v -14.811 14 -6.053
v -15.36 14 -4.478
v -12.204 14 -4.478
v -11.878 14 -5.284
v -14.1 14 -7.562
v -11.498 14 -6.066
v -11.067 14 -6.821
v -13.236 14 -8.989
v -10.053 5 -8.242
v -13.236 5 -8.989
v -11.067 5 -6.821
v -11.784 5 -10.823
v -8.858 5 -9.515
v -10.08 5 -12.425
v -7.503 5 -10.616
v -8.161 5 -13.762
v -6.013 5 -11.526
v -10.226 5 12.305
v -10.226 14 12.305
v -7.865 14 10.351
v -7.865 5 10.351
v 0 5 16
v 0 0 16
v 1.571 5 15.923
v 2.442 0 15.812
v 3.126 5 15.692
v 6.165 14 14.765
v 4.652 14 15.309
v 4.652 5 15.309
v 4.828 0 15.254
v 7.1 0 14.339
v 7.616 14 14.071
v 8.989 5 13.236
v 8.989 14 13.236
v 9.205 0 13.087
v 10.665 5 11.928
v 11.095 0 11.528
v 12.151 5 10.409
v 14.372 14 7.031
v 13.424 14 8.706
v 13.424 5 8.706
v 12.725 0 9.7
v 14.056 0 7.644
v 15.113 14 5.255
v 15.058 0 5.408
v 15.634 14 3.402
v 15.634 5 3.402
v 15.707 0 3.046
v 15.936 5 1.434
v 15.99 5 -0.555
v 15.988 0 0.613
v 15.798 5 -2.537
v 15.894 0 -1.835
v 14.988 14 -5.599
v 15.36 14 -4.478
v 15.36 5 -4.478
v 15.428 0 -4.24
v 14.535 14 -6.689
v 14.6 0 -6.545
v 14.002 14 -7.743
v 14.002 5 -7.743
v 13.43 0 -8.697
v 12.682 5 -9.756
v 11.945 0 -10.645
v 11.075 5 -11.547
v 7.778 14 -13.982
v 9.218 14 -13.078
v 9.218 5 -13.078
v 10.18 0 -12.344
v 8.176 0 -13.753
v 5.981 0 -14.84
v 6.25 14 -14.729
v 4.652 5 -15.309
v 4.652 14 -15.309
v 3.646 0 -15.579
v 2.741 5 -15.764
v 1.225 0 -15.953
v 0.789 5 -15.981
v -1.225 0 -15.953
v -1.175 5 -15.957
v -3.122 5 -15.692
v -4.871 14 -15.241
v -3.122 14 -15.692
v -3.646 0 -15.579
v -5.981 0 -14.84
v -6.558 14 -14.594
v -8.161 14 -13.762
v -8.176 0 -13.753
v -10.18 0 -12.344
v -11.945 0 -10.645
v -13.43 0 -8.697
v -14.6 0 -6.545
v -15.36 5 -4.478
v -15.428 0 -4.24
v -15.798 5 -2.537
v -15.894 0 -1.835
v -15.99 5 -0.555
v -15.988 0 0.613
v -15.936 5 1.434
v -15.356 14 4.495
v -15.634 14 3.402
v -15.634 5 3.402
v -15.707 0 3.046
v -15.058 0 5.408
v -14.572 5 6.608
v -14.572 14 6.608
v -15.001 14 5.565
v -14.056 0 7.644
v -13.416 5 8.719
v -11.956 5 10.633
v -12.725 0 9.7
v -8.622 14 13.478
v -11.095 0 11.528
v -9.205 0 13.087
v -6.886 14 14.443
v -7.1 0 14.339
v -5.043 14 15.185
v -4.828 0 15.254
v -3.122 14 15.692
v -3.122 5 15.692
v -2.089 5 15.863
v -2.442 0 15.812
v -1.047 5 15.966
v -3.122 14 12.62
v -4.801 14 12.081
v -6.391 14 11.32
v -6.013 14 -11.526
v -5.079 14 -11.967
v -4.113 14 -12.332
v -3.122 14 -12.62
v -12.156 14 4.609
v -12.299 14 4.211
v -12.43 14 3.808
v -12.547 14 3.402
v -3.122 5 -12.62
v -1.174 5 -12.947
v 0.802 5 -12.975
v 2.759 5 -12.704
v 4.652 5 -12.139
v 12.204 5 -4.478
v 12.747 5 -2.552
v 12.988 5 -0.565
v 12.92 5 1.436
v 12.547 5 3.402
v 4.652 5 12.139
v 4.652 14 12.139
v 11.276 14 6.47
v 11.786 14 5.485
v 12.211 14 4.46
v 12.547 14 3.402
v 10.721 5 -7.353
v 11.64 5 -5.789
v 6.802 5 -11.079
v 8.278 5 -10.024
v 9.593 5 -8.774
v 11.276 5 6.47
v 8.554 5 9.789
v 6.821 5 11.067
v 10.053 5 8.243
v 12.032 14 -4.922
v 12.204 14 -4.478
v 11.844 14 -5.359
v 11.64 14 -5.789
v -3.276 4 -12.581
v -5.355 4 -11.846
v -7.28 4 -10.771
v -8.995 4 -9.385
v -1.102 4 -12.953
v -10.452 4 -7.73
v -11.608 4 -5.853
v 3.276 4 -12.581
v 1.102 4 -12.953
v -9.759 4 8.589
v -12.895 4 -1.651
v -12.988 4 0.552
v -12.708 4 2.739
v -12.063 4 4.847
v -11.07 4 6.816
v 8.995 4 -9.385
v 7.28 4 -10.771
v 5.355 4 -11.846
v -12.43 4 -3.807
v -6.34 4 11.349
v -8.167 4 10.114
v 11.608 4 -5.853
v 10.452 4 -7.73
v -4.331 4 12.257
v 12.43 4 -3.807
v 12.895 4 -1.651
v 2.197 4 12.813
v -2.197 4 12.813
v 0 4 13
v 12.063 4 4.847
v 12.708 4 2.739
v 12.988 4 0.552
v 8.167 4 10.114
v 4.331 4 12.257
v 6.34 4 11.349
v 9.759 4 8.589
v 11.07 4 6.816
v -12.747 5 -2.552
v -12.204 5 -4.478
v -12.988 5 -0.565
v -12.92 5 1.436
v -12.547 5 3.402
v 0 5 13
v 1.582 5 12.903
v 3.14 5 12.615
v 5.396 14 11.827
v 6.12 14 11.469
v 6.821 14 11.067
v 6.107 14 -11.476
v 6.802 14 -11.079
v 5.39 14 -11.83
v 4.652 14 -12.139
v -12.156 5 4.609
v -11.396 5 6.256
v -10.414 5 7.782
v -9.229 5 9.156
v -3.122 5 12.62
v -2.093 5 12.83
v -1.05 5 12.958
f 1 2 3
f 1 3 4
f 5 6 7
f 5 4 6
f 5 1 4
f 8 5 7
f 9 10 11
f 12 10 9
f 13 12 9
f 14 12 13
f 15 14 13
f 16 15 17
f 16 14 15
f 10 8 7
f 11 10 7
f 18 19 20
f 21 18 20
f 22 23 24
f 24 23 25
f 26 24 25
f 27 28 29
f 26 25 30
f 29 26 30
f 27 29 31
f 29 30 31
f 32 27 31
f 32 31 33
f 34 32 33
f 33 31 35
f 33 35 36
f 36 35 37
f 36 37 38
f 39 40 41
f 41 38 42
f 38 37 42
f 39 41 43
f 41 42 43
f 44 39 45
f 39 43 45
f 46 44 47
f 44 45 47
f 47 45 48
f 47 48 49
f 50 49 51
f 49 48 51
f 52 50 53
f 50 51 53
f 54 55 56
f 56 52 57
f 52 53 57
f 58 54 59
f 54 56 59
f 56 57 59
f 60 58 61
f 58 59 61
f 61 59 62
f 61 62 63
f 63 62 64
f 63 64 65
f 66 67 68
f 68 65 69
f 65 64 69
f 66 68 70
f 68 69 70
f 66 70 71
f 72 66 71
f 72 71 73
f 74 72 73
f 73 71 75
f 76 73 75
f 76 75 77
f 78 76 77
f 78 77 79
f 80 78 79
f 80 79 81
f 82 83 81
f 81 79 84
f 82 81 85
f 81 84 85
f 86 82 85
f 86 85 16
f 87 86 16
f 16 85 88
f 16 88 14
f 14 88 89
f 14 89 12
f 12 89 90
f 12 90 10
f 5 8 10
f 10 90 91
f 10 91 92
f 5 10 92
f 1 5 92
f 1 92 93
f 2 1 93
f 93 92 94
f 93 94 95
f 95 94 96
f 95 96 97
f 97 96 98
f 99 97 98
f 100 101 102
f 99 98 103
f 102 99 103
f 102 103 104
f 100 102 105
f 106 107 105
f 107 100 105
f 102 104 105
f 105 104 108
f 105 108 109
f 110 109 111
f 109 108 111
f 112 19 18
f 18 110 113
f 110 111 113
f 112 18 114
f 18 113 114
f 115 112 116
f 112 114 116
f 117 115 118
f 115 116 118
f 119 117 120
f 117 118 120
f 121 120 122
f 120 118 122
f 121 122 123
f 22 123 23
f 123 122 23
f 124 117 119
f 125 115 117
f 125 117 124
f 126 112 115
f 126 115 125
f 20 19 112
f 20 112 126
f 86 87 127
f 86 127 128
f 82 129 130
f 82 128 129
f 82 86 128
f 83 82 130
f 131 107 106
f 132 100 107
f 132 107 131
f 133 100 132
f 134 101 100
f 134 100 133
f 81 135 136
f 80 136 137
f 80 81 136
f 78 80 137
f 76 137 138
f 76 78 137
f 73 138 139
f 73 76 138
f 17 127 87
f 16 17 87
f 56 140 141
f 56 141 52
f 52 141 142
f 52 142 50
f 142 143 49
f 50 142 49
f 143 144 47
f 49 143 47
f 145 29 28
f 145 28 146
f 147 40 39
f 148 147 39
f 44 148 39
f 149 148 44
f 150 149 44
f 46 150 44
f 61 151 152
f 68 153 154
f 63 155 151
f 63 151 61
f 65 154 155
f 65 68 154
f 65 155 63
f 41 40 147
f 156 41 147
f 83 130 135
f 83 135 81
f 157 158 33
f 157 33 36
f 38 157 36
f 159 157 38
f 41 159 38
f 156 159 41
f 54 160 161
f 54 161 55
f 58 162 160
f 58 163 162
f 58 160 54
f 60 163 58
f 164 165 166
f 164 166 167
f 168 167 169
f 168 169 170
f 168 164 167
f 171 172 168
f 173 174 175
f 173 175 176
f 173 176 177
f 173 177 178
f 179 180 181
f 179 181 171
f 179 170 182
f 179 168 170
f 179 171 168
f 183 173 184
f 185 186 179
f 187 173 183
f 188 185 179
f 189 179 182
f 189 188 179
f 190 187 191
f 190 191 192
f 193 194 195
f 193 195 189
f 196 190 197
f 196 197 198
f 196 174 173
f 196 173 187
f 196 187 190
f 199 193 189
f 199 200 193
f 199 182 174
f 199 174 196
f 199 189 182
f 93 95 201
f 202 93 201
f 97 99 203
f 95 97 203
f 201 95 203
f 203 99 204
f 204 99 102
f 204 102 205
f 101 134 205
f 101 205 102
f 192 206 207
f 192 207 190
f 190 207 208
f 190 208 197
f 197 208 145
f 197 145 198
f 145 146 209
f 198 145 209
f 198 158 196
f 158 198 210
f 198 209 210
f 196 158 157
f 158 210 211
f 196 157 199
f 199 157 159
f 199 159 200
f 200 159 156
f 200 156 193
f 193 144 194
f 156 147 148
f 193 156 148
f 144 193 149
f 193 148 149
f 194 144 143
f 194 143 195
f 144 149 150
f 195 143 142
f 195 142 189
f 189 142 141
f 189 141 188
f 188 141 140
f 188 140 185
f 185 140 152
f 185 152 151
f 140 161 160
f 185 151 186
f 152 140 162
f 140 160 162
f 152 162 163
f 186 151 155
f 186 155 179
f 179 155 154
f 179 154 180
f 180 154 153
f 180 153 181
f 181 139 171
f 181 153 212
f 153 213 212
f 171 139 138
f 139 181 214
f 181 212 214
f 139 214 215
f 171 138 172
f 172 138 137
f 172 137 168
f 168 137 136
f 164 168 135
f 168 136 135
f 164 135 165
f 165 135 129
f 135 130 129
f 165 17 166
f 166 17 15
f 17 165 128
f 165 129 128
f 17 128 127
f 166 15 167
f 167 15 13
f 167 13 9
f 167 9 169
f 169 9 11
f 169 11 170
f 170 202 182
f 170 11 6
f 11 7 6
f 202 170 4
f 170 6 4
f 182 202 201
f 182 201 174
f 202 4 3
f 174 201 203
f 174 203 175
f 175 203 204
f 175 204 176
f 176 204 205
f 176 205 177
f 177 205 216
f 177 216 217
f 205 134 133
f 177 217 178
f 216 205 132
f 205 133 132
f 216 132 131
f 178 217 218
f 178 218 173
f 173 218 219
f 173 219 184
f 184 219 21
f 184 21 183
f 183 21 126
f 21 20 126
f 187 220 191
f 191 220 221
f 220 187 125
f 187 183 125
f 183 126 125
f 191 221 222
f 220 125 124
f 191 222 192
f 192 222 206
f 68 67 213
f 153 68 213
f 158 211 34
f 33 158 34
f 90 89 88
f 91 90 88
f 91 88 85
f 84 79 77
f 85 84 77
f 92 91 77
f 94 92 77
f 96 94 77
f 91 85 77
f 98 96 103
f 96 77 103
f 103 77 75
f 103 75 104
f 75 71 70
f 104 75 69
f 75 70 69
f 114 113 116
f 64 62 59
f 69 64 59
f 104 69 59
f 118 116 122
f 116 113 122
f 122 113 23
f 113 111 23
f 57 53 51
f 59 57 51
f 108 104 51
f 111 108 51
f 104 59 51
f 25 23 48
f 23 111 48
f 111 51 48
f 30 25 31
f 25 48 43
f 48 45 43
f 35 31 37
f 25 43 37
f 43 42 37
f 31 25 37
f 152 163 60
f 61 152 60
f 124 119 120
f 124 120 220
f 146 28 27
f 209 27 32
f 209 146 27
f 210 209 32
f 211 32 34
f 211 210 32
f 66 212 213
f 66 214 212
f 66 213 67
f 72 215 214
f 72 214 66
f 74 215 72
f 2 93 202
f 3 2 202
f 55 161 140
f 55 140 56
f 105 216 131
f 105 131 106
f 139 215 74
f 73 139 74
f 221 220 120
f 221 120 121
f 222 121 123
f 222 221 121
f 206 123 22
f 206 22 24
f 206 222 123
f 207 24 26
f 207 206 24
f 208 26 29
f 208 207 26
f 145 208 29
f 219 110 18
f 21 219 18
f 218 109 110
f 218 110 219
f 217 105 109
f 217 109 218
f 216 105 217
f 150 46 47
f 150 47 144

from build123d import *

# Parameters (mm, degrees)
SKETCH_1_R           = 16
EXTRUDE_1_DEPTH      = 20
SKETCH_2_R           = 13
CUT_EXTRUDE_1_DEPTH  = 16
CUT_EXTRUDE_8_DEPTH  = 15
SKETCH_7_W           = 7.773458373
SKETCH_7_H           = 44.148318348
CUT_EXTRUDE_9_DEPTH  = 15
CUT_EXTRUDE_12_DEPTH = 15
CUT_EXTRUDE_14_DEPTH = 6


with BuildPart() as part:
    # 草图1 → 凸台-拉伸1 (new body)
    with BuildSketch(Plane(origin=(0, 0, 0), x_dir=(1, 0, 0), z_dir=(0, 1, 0))):
        with Locations(Location((0, 0, 0), (0, 0, 270))):
            Circle(SKETCH_1_R)
    extrude(amount=EXTRUDE_1_DEPTH)

    # 草图2 → 切除-拉伸1 (cut)
    with BuildSketch(Plane(origin=(0, 20, 0), x_dir=(1, 0, 0), z_dir=(0, 1, 0))):
        with Locations(Location((0, 0, 0), (0, 0, 270))):
            Circle(SKETCH_2_R)
    extrude(amount=-CUT_EXTRUDE_1_DEPTH, mode=Mode.SUBTRACT)

    # Sketch 3D_1 → 切除-拉伸8 (cut)
    with BuildSketch(Plane(origin=(-21.115525012, 20, -4.47842686), x_dir=(0.9837828296095457, 0, 0.17936372031555256), z_dir=(0, -1, 0))):
        Polygon((0, 0), (42.521972379, -7.752624798), (43.935434359, 0), (1.41346198, 7.752624798), align=None)
    extrude(amount=CUT_EXTRUDE_8_DEPTH, mode=Mode.SUBTRACT)

    # 草图7 → 切除-拉伸9 (cut)
    with BuildSketch(Plane(origin=(0, 20, 0), x_dir=(1, 0, 0), z_dir=(0, 1, 0))):
        with Locations((0.764910482, -0.180026065)):
            Rectangle(SKETCH_7_W, SKETCH_7_H)
    extrude(amount=-CUT_EXTRUDE_9_DEPTH, mode=Mode.SUBTRACT)

    # 草图8 → 切除-拉伸12 (cut)
    with BuildSketch(Plane(origin=(0, 20, 0), x_dir=(1, 0, 0), z_dir=(0, 1, 0))):
        Polygon((-0.220684434, -4.025865965), (-5.305815048, 1.059264649), (-20.221668569, -11.283691061), (-18.774175203, -19.378987698), align=None)
        Polygon((-12.618321187, 18.401718398), (-17.471521644, 13.224971244), (-5.305815048, 1.059264649), (-0.097842246, 5.368892492), align=None)
        with BuildLine():
            Line((9.217986526, 13.07779509), (6.801952348, 11.078512728))
            ThreePointArc((6.801952348, 11.078512728), (9.592762697, 8.773762239), (11.63996381, 5.788889574))
            Line((11.63996381, 5.788889574), (14.001568463, 7.743131187))
            ThreePointArc((14.001568463, 7.743131187), (11.912245515, 10.681685578), (9.217986526, 13.07779509))
        make_face()
        Polygon((4.875918089, 0.191602323), (-0.220684434, -4.025865965), (13.346301255, -17.592851655), (19.008368455, -14.519158032), align=None)
    extrude(amount=-CUT_EXTRUDE_12_DEPTH, mode=Mode.SUBTRACT)

    # Sketch 3D_2 → 切除-拉伸14 (cut)
    with BuildSketch(Plane(origin=(17.993102369, 20, -18.234682019), x_dir=(-0.7299619657231169, 0, 0.6834877677015465), z_dir=(0, -1, 0))):
        Polygon((0, 0), (27.649733988, 25.889369376), (51.890815184, 0), (24.241081197, -25.889369376), align=None)
    extrude(amount=CUT_EXTRUDE_14_DEPTH, mode=Mode.SUBTRACT)


solid = part.part
